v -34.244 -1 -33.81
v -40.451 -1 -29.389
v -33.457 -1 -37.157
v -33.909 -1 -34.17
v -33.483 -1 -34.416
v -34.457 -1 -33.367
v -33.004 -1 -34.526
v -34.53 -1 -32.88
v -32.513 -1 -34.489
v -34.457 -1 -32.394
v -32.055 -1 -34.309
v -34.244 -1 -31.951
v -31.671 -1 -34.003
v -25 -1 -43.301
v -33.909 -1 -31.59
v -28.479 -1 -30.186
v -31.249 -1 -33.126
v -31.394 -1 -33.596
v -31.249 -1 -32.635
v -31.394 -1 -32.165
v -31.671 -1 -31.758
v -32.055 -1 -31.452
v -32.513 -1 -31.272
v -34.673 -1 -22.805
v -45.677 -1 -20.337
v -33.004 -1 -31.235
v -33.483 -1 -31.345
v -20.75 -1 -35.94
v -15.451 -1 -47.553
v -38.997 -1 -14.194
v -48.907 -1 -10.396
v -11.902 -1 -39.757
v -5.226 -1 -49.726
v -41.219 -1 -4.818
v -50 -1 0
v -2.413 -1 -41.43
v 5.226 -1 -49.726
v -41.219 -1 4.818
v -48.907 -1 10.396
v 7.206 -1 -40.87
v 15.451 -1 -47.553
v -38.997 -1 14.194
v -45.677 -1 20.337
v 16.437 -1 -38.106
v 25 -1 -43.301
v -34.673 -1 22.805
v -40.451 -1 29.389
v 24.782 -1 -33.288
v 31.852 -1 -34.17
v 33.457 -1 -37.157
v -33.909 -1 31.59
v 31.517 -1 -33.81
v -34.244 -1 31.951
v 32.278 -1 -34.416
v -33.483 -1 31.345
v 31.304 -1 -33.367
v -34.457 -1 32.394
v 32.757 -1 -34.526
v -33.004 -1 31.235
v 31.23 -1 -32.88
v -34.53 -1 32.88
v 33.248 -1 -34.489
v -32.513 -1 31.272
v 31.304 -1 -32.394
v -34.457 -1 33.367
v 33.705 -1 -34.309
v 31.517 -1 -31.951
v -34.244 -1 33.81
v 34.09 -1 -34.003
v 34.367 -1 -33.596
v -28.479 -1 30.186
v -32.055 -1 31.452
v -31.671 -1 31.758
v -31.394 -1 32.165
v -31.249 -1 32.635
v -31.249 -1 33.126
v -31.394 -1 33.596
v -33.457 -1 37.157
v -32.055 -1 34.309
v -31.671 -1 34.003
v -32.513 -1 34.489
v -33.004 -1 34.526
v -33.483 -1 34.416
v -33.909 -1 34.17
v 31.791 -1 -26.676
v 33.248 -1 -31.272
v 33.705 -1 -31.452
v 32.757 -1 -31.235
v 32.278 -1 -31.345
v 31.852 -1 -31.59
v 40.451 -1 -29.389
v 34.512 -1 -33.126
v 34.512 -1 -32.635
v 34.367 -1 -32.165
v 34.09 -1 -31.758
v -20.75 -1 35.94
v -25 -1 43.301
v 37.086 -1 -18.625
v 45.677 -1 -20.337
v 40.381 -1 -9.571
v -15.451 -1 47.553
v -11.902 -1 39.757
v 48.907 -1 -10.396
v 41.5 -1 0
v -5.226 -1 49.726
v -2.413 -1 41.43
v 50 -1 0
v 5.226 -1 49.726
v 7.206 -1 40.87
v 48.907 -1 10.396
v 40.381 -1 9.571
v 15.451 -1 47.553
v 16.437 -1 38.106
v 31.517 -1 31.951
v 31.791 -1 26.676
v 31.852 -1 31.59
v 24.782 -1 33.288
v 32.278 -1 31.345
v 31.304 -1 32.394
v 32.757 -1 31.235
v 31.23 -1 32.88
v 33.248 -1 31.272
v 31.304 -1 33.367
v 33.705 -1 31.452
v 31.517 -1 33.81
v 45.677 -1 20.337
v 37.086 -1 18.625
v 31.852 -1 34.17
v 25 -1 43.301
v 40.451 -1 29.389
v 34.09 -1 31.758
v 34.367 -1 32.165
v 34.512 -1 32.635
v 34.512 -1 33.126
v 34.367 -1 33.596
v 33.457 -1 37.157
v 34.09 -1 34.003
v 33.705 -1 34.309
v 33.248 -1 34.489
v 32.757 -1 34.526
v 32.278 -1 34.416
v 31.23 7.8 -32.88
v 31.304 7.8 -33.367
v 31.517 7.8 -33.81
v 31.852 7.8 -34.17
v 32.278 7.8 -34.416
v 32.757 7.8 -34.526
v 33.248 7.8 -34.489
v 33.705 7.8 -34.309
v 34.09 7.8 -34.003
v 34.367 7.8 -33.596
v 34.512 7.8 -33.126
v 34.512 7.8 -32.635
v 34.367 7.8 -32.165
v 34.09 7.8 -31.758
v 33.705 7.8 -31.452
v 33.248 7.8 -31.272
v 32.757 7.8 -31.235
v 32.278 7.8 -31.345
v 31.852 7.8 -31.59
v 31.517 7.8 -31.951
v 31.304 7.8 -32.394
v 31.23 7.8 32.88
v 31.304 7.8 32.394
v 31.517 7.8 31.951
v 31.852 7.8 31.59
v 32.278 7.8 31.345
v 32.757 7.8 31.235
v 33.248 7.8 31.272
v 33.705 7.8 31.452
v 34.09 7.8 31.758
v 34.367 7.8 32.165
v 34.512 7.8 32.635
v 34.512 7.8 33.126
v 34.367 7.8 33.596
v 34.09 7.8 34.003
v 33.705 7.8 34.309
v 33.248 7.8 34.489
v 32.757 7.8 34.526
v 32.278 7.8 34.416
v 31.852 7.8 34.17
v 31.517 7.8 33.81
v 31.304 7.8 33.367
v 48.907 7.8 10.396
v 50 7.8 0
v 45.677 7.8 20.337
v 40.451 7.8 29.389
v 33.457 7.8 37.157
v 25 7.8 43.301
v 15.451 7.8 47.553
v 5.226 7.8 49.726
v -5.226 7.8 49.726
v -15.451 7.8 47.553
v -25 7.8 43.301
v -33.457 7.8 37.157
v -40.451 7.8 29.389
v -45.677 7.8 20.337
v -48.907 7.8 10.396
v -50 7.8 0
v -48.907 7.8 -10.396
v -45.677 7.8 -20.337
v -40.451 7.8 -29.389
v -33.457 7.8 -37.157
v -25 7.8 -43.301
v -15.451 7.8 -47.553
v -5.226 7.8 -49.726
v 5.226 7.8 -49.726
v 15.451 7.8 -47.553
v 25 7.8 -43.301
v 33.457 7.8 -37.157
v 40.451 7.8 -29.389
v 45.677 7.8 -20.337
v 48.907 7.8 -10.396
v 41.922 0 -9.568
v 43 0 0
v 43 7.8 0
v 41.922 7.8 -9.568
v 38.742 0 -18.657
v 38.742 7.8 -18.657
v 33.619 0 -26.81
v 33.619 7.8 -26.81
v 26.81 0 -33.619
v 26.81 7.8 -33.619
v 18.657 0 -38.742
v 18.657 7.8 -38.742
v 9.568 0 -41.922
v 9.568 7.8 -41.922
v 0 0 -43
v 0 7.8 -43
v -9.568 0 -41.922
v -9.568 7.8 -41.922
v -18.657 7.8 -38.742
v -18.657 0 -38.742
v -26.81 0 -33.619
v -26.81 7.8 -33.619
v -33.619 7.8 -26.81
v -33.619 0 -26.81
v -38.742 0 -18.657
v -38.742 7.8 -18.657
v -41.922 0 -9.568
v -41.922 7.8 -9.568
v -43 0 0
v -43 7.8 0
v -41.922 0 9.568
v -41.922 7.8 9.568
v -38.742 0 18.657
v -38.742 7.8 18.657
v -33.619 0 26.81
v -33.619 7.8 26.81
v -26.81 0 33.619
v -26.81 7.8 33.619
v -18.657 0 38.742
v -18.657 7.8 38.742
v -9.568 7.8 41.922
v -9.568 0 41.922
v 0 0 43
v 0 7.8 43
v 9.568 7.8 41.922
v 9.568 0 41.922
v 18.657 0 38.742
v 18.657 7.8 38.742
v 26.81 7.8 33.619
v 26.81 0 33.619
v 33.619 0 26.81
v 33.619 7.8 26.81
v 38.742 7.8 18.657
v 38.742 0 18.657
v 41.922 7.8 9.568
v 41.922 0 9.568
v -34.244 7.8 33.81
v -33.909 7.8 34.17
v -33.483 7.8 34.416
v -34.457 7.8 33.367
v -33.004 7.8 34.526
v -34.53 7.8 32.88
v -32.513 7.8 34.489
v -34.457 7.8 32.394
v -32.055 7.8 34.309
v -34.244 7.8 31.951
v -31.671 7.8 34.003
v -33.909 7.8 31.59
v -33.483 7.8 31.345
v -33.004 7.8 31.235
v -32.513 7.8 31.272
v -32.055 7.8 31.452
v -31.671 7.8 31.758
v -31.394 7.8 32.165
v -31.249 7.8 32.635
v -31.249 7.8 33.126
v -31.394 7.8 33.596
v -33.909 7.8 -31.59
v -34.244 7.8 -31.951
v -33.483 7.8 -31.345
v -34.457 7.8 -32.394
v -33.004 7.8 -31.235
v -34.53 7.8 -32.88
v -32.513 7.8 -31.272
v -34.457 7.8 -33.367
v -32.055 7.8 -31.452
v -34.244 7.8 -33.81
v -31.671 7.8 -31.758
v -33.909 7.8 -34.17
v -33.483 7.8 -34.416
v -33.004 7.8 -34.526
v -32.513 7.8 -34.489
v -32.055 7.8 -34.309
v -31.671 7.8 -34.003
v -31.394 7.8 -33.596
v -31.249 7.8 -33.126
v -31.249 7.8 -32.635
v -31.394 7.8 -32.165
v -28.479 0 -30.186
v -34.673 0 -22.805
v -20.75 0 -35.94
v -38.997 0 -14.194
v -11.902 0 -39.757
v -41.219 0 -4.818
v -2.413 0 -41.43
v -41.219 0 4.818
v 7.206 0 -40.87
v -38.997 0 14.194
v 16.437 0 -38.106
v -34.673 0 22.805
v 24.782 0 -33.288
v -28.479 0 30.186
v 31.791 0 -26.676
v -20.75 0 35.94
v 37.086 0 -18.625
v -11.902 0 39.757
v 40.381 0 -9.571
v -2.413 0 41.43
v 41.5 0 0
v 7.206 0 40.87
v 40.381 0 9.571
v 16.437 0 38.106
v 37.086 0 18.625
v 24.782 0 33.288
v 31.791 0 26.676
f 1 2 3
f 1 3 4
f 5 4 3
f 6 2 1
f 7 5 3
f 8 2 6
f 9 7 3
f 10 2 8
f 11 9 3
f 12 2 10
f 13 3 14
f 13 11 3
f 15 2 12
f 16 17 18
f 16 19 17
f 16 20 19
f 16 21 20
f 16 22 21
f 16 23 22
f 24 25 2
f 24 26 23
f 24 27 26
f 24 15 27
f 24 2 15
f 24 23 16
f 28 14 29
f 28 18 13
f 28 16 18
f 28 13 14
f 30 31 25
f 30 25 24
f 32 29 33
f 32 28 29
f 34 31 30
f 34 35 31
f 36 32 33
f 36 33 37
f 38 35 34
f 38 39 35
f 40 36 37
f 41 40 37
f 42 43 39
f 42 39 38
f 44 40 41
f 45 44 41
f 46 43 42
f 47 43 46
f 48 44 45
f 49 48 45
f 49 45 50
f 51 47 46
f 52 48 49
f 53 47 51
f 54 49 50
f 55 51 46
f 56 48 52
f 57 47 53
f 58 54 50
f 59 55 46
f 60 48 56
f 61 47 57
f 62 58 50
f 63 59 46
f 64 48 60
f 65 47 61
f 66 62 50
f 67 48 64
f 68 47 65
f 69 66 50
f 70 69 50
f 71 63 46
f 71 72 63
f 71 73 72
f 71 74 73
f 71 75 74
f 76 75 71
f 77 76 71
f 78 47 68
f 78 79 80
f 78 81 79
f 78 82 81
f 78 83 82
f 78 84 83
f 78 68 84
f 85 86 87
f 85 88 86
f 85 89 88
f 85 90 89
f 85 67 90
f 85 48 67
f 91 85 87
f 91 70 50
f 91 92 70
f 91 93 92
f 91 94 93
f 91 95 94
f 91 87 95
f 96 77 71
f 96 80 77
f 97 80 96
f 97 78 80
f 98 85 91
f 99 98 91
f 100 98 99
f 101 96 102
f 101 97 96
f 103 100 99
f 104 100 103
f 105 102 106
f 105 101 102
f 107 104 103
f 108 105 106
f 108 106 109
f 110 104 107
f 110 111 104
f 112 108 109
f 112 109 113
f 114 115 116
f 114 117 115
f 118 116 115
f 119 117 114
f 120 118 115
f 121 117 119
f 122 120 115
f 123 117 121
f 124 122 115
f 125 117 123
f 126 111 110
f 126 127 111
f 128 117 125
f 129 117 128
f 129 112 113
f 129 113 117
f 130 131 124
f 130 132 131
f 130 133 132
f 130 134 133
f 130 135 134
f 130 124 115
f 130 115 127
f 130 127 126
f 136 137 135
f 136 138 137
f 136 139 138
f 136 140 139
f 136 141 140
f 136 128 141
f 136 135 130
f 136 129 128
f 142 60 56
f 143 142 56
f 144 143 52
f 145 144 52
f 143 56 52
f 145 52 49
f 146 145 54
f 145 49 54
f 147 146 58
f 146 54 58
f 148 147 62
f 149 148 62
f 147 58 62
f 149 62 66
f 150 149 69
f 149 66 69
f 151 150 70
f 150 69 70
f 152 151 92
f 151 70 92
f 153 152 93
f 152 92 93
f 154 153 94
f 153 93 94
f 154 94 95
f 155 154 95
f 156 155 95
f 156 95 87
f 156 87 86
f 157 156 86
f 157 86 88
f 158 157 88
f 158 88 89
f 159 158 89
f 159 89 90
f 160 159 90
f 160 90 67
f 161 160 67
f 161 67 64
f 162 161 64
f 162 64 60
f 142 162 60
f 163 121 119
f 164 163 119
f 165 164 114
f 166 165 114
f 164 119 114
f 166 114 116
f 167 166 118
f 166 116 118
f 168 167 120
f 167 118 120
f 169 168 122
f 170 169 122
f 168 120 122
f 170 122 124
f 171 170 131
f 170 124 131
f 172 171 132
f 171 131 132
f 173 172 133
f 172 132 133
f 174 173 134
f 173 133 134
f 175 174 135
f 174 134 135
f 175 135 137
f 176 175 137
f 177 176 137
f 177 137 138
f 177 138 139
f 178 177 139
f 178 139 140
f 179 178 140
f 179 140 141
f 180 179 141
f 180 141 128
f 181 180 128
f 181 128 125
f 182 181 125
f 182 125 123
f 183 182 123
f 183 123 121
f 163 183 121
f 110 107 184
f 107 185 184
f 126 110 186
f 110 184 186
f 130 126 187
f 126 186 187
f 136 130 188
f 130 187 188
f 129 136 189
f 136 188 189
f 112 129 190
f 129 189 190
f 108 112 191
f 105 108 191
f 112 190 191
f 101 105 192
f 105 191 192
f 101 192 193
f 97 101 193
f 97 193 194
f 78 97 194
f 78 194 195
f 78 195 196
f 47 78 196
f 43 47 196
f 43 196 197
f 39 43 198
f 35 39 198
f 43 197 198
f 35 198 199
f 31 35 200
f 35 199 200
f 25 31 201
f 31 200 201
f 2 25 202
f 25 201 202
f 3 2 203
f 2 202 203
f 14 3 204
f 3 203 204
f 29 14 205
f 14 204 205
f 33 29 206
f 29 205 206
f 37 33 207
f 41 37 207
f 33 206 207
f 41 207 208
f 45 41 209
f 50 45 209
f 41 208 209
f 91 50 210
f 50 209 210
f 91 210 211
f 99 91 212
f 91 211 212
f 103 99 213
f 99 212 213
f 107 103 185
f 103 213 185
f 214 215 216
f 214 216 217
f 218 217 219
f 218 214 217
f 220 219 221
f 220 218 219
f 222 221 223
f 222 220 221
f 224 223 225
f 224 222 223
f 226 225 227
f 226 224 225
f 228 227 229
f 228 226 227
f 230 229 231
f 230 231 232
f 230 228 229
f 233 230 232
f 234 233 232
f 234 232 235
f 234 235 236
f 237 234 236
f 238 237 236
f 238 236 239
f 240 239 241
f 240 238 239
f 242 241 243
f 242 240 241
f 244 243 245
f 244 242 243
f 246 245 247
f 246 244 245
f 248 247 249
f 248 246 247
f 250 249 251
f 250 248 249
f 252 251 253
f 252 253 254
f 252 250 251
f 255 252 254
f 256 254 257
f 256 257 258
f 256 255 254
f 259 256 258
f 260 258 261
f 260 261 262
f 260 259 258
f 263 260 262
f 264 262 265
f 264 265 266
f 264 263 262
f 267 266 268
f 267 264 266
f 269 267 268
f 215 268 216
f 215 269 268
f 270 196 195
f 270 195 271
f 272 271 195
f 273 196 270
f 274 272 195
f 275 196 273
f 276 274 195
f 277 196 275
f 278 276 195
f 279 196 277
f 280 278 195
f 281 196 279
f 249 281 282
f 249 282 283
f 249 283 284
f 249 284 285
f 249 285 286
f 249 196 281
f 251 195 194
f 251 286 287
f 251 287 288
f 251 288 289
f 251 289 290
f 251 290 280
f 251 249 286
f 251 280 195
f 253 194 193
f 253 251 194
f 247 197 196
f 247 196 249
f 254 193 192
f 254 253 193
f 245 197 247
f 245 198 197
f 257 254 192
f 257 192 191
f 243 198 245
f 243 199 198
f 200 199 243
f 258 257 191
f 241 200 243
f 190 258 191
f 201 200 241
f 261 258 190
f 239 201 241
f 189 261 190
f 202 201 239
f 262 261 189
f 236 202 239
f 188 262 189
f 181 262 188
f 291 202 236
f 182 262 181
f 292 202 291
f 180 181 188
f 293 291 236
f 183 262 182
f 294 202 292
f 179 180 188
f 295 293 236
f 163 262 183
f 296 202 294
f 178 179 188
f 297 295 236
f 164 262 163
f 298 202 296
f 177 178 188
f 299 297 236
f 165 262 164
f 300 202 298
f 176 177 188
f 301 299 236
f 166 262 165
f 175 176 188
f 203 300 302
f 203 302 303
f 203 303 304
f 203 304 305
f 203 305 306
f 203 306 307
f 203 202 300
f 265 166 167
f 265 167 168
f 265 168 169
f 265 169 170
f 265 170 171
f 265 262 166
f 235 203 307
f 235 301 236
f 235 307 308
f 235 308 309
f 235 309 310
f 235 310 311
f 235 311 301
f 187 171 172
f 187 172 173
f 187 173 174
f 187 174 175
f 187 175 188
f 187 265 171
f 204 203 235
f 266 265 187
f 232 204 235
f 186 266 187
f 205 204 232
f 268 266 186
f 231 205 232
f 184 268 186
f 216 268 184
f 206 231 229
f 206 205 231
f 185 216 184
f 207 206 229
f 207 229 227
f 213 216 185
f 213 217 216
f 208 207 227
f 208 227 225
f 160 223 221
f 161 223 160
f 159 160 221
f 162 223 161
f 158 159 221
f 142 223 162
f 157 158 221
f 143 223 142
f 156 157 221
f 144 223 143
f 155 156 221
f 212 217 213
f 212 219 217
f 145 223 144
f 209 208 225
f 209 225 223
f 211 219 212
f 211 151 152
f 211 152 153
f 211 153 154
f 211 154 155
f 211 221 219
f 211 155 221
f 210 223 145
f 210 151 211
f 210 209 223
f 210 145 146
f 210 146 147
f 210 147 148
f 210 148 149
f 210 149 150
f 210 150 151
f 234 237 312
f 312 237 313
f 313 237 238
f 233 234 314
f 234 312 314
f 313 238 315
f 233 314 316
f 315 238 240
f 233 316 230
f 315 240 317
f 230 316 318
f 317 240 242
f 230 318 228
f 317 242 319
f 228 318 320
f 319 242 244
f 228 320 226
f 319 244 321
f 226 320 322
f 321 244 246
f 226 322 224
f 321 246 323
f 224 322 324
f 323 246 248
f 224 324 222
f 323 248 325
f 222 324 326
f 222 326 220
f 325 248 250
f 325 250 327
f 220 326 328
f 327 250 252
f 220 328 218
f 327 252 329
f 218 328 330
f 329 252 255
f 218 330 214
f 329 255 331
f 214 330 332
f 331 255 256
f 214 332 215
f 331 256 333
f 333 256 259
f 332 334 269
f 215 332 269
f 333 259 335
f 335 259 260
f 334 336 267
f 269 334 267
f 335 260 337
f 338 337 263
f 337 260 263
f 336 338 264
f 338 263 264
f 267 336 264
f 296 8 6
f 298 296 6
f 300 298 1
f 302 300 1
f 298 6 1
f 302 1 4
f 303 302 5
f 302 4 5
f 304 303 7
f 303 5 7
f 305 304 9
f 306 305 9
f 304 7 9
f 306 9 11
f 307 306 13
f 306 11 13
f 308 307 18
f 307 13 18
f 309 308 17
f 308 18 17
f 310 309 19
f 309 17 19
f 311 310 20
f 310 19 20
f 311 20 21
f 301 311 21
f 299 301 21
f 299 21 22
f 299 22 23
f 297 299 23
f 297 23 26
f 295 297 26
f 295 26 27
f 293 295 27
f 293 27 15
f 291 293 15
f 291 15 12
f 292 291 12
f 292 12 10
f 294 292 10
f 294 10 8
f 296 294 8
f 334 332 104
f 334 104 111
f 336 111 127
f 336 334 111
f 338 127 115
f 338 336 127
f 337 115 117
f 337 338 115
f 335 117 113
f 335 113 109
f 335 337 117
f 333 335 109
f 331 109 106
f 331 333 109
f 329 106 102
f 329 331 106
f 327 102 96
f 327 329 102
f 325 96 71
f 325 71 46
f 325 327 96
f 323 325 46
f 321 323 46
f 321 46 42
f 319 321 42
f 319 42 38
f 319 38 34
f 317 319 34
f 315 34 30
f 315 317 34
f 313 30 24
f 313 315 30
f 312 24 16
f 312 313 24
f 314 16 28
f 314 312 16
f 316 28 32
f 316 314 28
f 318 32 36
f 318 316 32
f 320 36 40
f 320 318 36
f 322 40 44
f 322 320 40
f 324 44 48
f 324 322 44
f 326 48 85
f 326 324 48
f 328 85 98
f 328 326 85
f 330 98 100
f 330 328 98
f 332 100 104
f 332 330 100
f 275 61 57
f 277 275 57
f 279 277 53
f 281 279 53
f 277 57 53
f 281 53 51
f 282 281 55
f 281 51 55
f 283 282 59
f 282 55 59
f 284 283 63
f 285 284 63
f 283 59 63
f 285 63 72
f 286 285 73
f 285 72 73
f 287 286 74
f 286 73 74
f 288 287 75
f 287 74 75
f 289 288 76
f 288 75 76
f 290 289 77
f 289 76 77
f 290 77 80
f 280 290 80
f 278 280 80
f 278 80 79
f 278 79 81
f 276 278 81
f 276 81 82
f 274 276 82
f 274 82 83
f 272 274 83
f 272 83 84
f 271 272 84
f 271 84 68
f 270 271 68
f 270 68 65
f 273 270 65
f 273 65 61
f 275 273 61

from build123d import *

# Parameters (mm, degrees)
SKETCH_2_R         = 50
SKETCH_2_R_2       = 43
EXTRUDE_1_DEPTH    = 7.8
SKETCH_3_R         = 50
SKETCH_3_R_2       = 41.5
EXTRUDE_2_DEPTH    = 1
HOLE_WIZARD_M4_1_D = 3.3


with BuildPart() as part:
    # 草图2 → 凸台-拉伸1 (new body)
    with BuildSketch(Plane(origin=(0, 0, 0), x_dir=(1, 0, 0), z_dir=(0, 1, 0))):
        Circle(SKETCH_2_R)
        Circle(SKETCH_2_R_2, mode=Mode.SUBTRACT)
    extrude(amount=EXTRUDE_1_DEPTH)

    # 草图3 → 凸台-拉伸2 (add)
    with BuildSketch(Plane.XZ):
        Circle(SKETCH_3_R)
        Circle(SKETCH_3_R_2, mode=Mode.SUBTRACT)
    extrude(amount=EXTRUDE_2_DEPTH)

    # M4 螺纹孔1 (through all)
    with Locations(Plane(origin=(0, 7.8, 0), x_dir=(1, 0, 0), z_dir=(0, 1, 0))):
        with Locations((-32.880465325, 32.880465325), (-32.880465325, -32.880465325), (32.880465325, -32.880465325), (32.880465325, 32.880465325)):
            Hole(HOLE_WIZARD_M4_1_D / 2)


solid = part.part
